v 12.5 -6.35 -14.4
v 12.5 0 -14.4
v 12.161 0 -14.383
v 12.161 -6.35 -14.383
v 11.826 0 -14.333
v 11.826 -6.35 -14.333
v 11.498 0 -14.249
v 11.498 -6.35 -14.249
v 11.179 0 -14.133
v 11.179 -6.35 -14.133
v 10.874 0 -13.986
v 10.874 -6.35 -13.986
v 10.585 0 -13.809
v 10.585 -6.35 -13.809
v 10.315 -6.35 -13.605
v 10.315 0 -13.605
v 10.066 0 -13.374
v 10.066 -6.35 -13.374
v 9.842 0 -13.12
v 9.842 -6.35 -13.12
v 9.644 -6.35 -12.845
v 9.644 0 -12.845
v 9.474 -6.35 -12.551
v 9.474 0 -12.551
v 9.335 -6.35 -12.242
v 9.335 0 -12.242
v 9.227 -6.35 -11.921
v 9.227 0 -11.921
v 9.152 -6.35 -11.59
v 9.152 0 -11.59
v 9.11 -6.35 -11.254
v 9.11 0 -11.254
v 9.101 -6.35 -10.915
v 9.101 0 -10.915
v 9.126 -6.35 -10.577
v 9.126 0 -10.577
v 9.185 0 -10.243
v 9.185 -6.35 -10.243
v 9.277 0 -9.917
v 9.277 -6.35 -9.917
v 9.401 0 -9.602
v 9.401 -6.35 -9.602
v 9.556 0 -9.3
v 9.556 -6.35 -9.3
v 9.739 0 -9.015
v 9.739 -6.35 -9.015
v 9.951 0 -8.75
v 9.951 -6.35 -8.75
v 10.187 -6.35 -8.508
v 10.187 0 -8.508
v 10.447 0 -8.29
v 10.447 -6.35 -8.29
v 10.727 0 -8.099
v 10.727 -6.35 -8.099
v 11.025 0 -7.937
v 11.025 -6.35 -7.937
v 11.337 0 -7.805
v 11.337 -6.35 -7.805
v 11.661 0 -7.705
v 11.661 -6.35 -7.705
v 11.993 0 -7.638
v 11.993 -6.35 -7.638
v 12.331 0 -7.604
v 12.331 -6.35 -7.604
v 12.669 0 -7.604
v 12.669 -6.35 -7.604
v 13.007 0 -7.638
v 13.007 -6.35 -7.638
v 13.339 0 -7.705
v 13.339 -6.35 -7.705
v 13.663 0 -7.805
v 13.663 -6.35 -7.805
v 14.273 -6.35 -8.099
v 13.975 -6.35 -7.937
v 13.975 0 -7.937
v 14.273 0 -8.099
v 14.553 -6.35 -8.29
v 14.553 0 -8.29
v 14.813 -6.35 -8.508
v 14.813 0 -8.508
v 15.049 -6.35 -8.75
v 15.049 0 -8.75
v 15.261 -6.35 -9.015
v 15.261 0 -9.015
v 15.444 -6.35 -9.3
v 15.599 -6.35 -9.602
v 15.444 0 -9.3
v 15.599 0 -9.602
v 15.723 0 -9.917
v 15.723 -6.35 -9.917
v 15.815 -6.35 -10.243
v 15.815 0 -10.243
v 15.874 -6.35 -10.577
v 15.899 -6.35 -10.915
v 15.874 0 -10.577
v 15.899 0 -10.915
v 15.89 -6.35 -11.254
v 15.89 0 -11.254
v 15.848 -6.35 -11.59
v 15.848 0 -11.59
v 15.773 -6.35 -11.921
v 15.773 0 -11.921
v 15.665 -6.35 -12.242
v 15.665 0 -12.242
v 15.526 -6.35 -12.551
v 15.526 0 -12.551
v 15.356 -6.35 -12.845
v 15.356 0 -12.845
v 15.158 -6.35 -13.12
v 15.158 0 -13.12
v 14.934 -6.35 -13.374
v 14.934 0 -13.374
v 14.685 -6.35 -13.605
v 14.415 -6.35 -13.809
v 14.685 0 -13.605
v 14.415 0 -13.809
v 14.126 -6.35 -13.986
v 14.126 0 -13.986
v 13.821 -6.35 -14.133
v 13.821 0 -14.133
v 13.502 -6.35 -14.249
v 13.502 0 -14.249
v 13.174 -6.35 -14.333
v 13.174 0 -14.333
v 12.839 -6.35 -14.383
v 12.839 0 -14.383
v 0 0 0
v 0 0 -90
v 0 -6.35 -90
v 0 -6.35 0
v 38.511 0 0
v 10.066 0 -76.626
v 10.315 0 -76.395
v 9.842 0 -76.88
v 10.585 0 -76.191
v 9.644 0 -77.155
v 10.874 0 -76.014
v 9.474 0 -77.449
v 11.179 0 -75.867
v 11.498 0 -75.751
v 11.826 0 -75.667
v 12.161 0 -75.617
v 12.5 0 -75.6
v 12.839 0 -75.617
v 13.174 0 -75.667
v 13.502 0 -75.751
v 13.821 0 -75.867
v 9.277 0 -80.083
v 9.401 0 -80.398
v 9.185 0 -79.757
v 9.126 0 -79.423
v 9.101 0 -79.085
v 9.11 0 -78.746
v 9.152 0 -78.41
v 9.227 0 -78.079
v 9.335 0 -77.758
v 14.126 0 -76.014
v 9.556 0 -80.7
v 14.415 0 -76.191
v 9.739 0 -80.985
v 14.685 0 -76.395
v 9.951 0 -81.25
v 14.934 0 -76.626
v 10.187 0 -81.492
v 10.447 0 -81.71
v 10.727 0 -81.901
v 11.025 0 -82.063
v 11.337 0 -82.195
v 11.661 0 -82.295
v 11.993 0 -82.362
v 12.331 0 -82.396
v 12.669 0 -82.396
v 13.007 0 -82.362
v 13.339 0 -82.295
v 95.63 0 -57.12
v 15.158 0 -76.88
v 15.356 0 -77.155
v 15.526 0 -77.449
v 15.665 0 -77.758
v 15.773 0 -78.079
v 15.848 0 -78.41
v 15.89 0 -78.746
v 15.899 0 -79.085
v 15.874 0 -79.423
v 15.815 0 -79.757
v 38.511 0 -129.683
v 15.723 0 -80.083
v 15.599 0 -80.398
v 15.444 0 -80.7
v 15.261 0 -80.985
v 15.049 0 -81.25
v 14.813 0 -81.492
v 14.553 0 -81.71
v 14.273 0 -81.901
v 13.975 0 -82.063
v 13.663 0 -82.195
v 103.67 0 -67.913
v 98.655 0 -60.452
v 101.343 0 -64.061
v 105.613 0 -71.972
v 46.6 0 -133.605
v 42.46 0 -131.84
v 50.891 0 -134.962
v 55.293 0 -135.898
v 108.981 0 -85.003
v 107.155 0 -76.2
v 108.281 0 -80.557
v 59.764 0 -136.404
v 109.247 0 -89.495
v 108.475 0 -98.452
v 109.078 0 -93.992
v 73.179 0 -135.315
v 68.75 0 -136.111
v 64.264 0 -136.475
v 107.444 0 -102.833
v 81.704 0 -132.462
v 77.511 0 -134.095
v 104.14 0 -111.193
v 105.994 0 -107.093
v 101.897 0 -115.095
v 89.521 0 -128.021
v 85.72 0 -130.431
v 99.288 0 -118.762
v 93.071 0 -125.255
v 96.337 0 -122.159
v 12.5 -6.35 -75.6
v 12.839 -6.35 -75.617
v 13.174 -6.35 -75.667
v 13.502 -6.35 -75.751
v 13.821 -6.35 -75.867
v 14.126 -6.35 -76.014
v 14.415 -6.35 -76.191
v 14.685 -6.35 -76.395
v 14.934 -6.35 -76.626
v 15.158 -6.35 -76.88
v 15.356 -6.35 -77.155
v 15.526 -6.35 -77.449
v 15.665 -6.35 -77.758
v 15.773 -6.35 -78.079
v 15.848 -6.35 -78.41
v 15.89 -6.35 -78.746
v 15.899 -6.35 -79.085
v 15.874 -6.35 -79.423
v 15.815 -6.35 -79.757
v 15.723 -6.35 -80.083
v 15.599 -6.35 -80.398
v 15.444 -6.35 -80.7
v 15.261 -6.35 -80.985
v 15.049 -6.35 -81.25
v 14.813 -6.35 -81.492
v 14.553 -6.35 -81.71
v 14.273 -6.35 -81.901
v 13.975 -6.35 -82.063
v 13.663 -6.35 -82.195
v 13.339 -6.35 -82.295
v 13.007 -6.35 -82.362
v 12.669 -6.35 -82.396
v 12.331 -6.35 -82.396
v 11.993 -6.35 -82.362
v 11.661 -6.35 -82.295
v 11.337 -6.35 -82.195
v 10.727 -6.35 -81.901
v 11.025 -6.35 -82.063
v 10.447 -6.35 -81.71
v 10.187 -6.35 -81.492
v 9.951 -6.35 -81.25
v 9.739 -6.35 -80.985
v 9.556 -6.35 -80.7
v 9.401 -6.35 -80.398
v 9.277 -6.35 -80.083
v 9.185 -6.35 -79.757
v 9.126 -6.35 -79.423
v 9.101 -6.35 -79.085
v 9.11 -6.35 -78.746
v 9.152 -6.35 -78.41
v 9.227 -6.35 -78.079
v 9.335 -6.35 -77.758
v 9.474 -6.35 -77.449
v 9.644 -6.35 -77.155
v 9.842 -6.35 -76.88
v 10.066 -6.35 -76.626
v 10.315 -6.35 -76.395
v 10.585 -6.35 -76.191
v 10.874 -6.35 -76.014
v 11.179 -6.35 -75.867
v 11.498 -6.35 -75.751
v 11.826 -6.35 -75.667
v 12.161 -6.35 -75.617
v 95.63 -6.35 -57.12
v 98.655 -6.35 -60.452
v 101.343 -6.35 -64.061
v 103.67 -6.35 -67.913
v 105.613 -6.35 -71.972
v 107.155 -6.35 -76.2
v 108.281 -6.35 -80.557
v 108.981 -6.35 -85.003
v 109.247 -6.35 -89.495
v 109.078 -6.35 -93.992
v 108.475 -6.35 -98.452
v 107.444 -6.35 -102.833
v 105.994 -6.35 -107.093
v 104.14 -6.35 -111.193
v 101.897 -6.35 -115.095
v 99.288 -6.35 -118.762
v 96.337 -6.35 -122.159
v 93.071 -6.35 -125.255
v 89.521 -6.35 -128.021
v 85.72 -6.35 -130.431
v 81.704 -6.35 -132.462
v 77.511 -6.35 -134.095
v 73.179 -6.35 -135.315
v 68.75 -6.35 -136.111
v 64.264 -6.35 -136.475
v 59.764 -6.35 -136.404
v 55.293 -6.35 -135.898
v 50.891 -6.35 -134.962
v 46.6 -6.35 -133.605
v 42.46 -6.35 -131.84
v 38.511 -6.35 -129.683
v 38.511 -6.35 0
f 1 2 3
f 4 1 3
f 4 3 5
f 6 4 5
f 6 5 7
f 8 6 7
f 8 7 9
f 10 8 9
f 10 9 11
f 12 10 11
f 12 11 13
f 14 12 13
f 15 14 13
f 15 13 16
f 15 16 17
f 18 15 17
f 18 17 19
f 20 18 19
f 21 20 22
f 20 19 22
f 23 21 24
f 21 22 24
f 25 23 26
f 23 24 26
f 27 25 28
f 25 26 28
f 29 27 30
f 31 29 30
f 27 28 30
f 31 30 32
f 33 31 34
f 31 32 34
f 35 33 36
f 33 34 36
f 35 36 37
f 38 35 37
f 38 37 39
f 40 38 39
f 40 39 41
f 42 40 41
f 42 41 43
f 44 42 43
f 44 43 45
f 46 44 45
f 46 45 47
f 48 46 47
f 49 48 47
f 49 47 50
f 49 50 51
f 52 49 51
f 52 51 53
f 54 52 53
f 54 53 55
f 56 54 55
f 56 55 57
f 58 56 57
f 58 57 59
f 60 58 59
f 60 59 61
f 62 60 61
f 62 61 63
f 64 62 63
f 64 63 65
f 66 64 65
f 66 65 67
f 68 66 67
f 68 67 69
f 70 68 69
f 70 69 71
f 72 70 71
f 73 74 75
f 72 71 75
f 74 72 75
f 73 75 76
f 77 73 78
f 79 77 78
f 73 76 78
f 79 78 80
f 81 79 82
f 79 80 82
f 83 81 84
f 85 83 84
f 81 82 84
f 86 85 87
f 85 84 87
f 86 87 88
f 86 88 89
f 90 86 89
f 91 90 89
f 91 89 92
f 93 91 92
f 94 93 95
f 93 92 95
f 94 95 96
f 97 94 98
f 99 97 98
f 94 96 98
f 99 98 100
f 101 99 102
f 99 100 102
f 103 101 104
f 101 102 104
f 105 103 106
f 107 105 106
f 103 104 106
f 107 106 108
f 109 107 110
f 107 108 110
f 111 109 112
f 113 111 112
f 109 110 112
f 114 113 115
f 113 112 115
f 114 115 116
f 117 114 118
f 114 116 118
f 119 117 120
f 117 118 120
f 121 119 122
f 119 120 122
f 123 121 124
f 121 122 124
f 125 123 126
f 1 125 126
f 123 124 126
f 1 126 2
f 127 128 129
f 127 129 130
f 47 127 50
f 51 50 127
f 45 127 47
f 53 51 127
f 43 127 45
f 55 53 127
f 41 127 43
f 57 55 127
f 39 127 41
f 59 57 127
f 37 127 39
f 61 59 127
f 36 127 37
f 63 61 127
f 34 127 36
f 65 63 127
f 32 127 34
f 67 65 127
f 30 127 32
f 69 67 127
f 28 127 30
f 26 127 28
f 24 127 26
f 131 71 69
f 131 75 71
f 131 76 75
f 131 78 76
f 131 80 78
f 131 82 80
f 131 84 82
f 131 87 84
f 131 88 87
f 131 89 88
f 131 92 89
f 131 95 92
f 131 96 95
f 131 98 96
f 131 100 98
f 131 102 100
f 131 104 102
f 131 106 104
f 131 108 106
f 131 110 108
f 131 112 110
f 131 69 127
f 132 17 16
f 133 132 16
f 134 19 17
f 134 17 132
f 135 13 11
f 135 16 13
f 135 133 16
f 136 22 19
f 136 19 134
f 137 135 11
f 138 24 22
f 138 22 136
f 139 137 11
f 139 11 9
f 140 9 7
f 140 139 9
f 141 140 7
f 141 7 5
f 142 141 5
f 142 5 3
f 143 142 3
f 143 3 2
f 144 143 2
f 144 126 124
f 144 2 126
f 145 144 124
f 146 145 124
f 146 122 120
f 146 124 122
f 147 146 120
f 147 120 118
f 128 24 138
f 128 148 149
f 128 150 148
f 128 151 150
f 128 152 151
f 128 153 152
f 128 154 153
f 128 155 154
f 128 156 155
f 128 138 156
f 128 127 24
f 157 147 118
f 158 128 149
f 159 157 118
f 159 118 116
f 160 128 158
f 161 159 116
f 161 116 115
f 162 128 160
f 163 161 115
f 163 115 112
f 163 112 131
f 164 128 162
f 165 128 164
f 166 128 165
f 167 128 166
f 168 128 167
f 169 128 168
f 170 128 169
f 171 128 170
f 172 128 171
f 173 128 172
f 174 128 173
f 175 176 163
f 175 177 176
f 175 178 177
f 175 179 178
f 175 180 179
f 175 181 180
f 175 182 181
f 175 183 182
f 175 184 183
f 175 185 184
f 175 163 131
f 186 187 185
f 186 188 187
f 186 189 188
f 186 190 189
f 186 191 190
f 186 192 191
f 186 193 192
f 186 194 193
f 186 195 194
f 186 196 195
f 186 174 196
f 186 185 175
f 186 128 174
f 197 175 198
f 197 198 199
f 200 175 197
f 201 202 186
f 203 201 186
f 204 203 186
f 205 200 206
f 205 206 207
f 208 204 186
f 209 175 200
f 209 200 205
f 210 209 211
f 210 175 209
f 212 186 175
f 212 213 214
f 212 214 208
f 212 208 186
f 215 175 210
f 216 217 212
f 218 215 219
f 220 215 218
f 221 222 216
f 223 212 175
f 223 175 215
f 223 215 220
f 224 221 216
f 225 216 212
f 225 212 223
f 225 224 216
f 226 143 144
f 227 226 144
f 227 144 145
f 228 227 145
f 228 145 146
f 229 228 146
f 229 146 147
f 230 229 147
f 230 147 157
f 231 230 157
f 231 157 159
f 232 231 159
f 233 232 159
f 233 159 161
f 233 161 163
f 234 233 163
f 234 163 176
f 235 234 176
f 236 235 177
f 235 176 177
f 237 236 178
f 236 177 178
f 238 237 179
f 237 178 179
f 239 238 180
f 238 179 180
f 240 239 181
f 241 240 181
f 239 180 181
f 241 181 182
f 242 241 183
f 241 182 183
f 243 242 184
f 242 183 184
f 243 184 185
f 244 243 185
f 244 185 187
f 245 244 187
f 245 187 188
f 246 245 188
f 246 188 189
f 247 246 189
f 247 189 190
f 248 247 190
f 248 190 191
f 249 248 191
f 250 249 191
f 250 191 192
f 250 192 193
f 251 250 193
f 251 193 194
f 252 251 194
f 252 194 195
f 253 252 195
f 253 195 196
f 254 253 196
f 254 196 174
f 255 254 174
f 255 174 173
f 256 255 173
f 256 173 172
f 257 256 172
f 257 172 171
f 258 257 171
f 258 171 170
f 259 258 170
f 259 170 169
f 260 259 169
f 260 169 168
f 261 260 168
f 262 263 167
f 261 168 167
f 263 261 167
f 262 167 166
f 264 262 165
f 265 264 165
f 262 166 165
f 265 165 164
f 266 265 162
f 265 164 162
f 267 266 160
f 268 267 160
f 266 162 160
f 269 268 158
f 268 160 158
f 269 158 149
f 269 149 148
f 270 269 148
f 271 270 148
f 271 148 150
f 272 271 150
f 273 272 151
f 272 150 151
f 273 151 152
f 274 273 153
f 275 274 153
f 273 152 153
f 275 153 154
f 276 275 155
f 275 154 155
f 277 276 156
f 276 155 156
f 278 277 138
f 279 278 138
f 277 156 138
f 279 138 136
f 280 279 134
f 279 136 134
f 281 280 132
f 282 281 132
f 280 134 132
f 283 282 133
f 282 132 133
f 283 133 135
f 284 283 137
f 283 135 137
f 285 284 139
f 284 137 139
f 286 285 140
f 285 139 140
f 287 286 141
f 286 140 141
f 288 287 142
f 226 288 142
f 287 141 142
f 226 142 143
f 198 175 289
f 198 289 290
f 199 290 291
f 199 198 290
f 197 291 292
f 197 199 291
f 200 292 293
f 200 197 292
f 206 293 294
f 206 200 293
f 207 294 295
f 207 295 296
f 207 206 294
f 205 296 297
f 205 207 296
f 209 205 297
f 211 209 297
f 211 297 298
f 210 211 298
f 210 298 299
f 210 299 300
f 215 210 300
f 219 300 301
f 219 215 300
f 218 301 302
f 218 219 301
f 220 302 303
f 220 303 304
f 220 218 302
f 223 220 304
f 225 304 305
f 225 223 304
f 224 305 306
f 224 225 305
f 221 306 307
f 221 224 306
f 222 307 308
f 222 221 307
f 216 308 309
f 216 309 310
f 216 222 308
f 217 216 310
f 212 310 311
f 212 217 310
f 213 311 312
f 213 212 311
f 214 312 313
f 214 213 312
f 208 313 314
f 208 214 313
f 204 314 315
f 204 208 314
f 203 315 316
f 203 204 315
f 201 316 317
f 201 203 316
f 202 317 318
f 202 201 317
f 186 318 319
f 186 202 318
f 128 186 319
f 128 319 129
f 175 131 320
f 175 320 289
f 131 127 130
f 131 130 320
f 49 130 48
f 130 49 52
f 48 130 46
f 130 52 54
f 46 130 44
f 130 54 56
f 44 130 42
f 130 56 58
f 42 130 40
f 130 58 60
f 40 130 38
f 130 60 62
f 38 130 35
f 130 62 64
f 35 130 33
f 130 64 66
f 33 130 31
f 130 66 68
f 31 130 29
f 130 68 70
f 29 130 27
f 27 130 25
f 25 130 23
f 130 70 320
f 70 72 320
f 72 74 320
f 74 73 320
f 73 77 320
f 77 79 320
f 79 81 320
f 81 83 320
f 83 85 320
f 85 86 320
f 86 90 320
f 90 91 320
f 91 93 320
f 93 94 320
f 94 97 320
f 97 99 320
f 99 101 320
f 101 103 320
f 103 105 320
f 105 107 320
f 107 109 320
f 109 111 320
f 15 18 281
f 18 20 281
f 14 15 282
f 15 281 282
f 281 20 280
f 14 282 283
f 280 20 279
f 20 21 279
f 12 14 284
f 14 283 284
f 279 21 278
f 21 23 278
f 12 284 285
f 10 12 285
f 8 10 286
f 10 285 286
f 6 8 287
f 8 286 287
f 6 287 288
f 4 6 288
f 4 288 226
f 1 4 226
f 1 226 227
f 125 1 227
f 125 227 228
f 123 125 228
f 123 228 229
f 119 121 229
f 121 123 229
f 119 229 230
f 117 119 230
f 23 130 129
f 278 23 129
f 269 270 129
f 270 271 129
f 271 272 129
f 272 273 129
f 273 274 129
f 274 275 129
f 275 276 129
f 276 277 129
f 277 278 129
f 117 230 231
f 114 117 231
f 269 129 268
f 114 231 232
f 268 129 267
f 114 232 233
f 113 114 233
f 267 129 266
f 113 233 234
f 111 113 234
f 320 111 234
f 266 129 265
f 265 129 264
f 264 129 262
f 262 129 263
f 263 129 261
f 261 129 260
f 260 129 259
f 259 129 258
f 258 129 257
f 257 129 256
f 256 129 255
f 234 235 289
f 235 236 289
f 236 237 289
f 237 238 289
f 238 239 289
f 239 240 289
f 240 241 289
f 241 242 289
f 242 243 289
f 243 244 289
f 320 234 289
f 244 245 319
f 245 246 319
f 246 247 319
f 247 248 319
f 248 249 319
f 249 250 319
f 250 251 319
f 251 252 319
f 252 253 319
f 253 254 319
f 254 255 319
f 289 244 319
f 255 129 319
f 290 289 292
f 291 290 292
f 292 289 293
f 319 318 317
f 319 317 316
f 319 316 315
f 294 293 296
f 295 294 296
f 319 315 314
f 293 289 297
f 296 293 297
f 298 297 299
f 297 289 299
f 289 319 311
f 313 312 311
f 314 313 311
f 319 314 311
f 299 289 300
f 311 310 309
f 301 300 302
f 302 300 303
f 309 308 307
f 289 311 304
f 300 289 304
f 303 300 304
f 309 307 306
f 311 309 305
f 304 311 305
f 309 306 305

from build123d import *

# Parameters (mm, degrees)
BASE_FLANGE1_DEPTH = 6.35
SKETCH8_R          = 3.4
CUT_EXTRUDE1_DEPTH = 175.95180765


# Sheet-metal steps are written as plain solids
with BuildPart() as part:
    # Sketch2 → Base-Flange1 (new body)
    with BuildSketch(Plane(origin=(0, 0, 0), x_dir=(1, 0, 0), z_dir=(0, 1, 0))):
        with BuildLine():
            Line((0, 0), (38.51093065, 0))
            Line((38.51093065, 0), (95.630465325, 57.119534675))
            ThreePointArc((95.630465325, 57.119534675), (99.287953618, 118.761570635), (38.51093065, 129.682710556))
            Line((38.51093065, 129.682710556), (0, 90))
            Line((0, 90), (0, 0))
        make_face()
    extrude(amount=-BASE_FLANGE1_DEPTH)

    # Sketch8 → Cut-Extrude1 (cut, through all)
    with BuildSketch(Plane(origin=(0, 0, 0), x_dir=(1, 0, 0), z_dir=(0, 1, 0))):
        with Locations(Location((12.5, 79, 0), (0, 0, 270))):
            Circle(SKETCH8_R)
        with Locations(Location((12.5, 11, 0), (0, 0, 90))):
            Circle(SKETCH8_R)
    extrude(amount=-CUT_EXTRUDE1_DEPTH, mode=Mode.SUBTRACT)


solid = part.part
